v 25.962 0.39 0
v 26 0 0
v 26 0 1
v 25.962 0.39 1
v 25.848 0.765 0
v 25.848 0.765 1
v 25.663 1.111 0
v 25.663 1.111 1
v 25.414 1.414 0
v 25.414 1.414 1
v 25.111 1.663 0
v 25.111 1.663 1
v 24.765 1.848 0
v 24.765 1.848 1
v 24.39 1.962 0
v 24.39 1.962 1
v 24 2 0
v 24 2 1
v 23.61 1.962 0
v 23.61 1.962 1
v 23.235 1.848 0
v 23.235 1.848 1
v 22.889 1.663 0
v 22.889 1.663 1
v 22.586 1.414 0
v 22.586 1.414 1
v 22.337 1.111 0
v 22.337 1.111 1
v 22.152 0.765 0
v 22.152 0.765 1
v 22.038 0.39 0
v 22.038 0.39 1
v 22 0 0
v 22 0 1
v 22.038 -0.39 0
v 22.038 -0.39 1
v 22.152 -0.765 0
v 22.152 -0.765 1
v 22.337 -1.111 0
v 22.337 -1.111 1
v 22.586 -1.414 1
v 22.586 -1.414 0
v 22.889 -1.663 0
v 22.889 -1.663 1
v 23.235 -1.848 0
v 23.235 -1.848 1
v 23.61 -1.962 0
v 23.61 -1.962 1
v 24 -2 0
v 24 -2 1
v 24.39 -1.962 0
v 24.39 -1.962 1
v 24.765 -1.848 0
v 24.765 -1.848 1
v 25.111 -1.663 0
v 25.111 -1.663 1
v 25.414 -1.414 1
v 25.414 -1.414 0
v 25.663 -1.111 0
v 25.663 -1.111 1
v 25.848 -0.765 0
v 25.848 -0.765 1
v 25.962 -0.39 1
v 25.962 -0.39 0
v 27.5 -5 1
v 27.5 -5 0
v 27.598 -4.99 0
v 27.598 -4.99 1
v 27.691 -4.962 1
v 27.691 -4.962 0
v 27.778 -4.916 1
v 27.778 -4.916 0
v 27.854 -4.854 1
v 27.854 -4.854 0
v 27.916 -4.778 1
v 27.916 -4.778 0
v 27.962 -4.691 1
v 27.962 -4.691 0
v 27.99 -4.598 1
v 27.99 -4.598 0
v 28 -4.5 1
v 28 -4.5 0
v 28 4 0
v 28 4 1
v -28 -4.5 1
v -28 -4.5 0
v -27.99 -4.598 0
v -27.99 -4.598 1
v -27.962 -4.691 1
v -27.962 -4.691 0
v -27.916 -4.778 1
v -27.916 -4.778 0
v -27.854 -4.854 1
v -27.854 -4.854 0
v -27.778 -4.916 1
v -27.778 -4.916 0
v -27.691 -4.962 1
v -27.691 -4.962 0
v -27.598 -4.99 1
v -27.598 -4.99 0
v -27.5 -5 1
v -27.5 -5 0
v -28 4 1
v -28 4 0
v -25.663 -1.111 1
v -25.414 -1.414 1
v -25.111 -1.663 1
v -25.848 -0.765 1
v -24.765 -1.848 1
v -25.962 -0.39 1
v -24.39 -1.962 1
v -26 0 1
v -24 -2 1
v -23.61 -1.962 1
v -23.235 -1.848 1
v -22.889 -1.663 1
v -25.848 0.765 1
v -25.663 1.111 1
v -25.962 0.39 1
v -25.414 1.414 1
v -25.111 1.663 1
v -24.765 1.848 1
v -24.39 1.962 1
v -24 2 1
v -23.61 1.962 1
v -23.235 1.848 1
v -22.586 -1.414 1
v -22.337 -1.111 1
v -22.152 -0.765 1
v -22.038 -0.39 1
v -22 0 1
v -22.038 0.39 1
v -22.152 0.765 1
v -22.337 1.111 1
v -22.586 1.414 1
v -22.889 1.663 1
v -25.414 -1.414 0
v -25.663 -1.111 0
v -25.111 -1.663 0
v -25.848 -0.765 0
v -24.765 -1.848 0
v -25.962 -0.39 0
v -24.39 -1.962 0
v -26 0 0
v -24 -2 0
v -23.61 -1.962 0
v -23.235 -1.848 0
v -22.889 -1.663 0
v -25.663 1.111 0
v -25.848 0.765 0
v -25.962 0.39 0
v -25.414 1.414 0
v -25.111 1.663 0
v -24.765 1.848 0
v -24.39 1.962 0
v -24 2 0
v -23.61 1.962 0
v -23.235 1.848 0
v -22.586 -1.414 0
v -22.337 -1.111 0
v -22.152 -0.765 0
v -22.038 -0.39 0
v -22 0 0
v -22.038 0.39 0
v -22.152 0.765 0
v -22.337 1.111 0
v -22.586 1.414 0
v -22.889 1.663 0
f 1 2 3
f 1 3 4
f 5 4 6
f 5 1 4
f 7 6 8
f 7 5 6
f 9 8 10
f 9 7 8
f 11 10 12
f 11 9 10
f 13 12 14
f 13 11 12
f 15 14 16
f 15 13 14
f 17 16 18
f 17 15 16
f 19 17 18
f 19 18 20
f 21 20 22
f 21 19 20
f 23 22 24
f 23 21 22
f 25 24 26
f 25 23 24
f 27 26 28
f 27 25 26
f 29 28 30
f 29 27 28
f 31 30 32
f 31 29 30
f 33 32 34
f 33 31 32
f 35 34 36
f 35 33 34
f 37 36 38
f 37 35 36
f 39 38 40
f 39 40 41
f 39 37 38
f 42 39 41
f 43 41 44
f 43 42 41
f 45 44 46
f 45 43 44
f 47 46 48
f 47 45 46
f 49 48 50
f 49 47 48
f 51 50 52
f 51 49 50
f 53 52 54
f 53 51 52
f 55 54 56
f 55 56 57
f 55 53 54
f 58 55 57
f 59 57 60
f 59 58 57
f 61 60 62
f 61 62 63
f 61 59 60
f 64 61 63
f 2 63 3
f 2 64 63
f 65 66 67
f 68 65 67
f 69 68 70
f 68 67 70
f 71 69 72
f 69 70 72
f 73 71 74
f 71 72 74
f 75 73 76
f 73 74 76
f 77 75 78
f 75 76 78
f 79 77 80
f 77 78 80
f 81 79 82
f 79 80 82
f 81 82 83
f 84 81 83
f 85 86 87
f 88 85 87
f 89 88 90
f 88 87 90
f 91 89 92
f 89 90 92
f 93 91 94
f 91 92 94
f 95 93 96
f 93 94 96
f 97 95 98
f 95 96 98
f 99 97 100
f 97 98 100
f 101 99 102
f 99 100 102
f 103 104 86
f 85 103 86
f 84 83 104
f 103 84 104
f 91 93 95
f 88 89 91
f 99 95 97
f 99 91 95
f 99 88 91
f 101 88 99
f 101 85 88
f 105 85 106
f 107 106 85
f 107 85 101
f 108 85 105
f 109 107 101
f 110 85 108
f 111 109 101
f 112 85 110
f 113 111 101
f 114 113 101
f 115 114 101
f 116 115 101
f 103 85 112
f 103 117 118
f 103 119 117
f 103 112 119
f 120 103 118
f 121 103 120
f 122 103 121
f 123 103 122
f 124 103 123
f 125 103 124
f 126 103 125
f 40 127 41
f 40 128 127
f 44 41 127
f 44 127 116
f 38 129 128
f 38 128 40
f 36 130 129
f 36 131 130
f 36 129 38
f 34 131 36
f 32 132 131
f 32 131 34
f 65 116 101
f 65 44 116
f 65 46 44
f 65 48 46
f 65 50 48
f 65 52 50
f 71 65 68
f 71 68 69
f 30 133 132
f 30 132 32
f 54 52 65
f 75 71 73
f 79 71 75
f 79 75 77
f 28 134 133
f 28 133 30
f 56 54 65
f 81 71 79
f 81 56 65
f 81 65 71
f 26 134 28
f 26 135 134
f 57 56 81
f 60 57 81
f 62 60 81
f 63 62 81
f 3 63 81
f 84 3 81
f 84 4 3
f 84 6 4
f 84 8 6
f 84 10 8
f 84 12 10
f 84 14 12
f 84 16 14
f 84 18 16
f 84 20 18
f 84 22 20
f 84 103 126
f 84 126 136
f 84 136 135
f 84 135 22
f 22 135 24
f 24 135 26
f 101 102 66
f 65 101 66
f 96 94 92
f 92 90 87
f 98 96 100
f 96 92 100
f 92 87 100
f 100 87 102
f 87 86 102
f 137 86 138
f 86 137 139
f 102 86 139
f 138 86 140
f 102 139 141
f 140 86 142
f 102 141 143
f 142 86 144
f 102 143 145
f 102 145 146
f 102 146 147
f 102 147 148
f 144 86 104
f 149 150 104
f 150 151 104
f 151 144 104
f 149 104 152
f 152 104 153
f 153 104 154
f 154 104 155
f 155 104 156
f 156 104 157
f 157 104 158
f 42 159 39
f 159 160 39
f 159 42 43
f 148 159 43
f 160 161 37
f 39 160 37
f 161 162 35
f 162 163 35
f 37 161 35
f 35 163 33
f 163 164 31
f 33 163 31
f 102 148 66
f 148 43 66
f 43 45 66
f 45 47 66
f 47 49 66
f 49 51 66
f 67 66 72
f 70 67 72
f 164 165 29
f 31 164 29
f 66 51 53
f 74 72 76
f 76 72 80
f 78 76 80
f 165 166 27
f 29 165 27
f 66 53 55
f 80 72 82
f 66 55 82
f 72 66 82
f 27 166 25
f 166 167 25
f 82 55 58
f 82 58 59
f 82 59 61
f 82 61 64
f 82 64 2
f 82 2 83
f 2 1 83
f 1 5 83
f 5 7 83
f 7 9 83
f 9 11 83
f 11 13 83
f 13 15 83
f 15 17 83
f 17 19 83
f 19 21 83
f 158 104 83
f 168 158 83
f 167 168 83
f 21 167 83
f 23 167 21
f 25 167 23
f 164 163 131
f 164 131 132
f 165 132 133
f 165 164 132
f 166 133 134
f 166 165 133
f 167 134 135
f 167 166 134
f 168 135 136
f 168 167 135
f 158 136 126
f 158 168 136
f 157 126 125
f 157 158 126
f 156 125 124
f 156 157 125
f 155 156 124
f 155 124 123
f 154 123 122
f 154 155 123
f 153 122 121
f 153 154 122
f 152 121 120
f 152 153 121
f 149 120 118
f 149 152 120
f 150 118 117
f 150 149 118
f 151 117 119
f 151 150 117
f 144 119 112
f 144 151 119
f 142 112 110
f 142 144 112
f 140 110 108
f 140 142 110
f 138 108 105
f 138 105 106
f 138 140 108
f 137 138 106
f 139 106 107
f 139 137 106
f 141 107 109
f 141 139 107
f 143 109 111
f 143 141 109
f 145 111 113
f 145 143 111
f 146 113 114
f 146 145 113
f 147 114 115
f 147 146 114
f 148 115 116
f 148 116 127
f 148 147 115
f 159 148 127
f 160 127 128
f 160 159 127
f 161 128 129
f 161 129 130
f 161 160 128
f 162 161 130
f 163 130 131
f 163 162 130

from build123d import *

# Parameters (mm, degrees)
F0_R     = 2
F1_DEPTH = 1


with BuildPart() as f1:
    # F0 (on Top) → F1 (new body)
    with BuildSketch(Plane.XY):
        with BuildLine():
            ThreePointArc((-28, -4.5), (-27.853553, -4.853553), (-27.5, -5))
            Line((-27.5, -5), (27.5, -5))
            ThreePointArc((27.5, -5), (27.853553, -4.853553), (28, -4.5))
            Line((28, -4.5), (28, 4))
            Line((28, 4), (-28, 4))
            Line((-28, 4), (-28, -4.5))
        make_face()
        with Locations((-24, 0)):
            Circle(F0_R, mode=Mode.SUBTRACT)
        with Locations((24, 0)):
            Circle(F0_R, mode=Mode.SUBTRACT)
    extrude(amount=F1_DEPTH)


solid = f1.part
